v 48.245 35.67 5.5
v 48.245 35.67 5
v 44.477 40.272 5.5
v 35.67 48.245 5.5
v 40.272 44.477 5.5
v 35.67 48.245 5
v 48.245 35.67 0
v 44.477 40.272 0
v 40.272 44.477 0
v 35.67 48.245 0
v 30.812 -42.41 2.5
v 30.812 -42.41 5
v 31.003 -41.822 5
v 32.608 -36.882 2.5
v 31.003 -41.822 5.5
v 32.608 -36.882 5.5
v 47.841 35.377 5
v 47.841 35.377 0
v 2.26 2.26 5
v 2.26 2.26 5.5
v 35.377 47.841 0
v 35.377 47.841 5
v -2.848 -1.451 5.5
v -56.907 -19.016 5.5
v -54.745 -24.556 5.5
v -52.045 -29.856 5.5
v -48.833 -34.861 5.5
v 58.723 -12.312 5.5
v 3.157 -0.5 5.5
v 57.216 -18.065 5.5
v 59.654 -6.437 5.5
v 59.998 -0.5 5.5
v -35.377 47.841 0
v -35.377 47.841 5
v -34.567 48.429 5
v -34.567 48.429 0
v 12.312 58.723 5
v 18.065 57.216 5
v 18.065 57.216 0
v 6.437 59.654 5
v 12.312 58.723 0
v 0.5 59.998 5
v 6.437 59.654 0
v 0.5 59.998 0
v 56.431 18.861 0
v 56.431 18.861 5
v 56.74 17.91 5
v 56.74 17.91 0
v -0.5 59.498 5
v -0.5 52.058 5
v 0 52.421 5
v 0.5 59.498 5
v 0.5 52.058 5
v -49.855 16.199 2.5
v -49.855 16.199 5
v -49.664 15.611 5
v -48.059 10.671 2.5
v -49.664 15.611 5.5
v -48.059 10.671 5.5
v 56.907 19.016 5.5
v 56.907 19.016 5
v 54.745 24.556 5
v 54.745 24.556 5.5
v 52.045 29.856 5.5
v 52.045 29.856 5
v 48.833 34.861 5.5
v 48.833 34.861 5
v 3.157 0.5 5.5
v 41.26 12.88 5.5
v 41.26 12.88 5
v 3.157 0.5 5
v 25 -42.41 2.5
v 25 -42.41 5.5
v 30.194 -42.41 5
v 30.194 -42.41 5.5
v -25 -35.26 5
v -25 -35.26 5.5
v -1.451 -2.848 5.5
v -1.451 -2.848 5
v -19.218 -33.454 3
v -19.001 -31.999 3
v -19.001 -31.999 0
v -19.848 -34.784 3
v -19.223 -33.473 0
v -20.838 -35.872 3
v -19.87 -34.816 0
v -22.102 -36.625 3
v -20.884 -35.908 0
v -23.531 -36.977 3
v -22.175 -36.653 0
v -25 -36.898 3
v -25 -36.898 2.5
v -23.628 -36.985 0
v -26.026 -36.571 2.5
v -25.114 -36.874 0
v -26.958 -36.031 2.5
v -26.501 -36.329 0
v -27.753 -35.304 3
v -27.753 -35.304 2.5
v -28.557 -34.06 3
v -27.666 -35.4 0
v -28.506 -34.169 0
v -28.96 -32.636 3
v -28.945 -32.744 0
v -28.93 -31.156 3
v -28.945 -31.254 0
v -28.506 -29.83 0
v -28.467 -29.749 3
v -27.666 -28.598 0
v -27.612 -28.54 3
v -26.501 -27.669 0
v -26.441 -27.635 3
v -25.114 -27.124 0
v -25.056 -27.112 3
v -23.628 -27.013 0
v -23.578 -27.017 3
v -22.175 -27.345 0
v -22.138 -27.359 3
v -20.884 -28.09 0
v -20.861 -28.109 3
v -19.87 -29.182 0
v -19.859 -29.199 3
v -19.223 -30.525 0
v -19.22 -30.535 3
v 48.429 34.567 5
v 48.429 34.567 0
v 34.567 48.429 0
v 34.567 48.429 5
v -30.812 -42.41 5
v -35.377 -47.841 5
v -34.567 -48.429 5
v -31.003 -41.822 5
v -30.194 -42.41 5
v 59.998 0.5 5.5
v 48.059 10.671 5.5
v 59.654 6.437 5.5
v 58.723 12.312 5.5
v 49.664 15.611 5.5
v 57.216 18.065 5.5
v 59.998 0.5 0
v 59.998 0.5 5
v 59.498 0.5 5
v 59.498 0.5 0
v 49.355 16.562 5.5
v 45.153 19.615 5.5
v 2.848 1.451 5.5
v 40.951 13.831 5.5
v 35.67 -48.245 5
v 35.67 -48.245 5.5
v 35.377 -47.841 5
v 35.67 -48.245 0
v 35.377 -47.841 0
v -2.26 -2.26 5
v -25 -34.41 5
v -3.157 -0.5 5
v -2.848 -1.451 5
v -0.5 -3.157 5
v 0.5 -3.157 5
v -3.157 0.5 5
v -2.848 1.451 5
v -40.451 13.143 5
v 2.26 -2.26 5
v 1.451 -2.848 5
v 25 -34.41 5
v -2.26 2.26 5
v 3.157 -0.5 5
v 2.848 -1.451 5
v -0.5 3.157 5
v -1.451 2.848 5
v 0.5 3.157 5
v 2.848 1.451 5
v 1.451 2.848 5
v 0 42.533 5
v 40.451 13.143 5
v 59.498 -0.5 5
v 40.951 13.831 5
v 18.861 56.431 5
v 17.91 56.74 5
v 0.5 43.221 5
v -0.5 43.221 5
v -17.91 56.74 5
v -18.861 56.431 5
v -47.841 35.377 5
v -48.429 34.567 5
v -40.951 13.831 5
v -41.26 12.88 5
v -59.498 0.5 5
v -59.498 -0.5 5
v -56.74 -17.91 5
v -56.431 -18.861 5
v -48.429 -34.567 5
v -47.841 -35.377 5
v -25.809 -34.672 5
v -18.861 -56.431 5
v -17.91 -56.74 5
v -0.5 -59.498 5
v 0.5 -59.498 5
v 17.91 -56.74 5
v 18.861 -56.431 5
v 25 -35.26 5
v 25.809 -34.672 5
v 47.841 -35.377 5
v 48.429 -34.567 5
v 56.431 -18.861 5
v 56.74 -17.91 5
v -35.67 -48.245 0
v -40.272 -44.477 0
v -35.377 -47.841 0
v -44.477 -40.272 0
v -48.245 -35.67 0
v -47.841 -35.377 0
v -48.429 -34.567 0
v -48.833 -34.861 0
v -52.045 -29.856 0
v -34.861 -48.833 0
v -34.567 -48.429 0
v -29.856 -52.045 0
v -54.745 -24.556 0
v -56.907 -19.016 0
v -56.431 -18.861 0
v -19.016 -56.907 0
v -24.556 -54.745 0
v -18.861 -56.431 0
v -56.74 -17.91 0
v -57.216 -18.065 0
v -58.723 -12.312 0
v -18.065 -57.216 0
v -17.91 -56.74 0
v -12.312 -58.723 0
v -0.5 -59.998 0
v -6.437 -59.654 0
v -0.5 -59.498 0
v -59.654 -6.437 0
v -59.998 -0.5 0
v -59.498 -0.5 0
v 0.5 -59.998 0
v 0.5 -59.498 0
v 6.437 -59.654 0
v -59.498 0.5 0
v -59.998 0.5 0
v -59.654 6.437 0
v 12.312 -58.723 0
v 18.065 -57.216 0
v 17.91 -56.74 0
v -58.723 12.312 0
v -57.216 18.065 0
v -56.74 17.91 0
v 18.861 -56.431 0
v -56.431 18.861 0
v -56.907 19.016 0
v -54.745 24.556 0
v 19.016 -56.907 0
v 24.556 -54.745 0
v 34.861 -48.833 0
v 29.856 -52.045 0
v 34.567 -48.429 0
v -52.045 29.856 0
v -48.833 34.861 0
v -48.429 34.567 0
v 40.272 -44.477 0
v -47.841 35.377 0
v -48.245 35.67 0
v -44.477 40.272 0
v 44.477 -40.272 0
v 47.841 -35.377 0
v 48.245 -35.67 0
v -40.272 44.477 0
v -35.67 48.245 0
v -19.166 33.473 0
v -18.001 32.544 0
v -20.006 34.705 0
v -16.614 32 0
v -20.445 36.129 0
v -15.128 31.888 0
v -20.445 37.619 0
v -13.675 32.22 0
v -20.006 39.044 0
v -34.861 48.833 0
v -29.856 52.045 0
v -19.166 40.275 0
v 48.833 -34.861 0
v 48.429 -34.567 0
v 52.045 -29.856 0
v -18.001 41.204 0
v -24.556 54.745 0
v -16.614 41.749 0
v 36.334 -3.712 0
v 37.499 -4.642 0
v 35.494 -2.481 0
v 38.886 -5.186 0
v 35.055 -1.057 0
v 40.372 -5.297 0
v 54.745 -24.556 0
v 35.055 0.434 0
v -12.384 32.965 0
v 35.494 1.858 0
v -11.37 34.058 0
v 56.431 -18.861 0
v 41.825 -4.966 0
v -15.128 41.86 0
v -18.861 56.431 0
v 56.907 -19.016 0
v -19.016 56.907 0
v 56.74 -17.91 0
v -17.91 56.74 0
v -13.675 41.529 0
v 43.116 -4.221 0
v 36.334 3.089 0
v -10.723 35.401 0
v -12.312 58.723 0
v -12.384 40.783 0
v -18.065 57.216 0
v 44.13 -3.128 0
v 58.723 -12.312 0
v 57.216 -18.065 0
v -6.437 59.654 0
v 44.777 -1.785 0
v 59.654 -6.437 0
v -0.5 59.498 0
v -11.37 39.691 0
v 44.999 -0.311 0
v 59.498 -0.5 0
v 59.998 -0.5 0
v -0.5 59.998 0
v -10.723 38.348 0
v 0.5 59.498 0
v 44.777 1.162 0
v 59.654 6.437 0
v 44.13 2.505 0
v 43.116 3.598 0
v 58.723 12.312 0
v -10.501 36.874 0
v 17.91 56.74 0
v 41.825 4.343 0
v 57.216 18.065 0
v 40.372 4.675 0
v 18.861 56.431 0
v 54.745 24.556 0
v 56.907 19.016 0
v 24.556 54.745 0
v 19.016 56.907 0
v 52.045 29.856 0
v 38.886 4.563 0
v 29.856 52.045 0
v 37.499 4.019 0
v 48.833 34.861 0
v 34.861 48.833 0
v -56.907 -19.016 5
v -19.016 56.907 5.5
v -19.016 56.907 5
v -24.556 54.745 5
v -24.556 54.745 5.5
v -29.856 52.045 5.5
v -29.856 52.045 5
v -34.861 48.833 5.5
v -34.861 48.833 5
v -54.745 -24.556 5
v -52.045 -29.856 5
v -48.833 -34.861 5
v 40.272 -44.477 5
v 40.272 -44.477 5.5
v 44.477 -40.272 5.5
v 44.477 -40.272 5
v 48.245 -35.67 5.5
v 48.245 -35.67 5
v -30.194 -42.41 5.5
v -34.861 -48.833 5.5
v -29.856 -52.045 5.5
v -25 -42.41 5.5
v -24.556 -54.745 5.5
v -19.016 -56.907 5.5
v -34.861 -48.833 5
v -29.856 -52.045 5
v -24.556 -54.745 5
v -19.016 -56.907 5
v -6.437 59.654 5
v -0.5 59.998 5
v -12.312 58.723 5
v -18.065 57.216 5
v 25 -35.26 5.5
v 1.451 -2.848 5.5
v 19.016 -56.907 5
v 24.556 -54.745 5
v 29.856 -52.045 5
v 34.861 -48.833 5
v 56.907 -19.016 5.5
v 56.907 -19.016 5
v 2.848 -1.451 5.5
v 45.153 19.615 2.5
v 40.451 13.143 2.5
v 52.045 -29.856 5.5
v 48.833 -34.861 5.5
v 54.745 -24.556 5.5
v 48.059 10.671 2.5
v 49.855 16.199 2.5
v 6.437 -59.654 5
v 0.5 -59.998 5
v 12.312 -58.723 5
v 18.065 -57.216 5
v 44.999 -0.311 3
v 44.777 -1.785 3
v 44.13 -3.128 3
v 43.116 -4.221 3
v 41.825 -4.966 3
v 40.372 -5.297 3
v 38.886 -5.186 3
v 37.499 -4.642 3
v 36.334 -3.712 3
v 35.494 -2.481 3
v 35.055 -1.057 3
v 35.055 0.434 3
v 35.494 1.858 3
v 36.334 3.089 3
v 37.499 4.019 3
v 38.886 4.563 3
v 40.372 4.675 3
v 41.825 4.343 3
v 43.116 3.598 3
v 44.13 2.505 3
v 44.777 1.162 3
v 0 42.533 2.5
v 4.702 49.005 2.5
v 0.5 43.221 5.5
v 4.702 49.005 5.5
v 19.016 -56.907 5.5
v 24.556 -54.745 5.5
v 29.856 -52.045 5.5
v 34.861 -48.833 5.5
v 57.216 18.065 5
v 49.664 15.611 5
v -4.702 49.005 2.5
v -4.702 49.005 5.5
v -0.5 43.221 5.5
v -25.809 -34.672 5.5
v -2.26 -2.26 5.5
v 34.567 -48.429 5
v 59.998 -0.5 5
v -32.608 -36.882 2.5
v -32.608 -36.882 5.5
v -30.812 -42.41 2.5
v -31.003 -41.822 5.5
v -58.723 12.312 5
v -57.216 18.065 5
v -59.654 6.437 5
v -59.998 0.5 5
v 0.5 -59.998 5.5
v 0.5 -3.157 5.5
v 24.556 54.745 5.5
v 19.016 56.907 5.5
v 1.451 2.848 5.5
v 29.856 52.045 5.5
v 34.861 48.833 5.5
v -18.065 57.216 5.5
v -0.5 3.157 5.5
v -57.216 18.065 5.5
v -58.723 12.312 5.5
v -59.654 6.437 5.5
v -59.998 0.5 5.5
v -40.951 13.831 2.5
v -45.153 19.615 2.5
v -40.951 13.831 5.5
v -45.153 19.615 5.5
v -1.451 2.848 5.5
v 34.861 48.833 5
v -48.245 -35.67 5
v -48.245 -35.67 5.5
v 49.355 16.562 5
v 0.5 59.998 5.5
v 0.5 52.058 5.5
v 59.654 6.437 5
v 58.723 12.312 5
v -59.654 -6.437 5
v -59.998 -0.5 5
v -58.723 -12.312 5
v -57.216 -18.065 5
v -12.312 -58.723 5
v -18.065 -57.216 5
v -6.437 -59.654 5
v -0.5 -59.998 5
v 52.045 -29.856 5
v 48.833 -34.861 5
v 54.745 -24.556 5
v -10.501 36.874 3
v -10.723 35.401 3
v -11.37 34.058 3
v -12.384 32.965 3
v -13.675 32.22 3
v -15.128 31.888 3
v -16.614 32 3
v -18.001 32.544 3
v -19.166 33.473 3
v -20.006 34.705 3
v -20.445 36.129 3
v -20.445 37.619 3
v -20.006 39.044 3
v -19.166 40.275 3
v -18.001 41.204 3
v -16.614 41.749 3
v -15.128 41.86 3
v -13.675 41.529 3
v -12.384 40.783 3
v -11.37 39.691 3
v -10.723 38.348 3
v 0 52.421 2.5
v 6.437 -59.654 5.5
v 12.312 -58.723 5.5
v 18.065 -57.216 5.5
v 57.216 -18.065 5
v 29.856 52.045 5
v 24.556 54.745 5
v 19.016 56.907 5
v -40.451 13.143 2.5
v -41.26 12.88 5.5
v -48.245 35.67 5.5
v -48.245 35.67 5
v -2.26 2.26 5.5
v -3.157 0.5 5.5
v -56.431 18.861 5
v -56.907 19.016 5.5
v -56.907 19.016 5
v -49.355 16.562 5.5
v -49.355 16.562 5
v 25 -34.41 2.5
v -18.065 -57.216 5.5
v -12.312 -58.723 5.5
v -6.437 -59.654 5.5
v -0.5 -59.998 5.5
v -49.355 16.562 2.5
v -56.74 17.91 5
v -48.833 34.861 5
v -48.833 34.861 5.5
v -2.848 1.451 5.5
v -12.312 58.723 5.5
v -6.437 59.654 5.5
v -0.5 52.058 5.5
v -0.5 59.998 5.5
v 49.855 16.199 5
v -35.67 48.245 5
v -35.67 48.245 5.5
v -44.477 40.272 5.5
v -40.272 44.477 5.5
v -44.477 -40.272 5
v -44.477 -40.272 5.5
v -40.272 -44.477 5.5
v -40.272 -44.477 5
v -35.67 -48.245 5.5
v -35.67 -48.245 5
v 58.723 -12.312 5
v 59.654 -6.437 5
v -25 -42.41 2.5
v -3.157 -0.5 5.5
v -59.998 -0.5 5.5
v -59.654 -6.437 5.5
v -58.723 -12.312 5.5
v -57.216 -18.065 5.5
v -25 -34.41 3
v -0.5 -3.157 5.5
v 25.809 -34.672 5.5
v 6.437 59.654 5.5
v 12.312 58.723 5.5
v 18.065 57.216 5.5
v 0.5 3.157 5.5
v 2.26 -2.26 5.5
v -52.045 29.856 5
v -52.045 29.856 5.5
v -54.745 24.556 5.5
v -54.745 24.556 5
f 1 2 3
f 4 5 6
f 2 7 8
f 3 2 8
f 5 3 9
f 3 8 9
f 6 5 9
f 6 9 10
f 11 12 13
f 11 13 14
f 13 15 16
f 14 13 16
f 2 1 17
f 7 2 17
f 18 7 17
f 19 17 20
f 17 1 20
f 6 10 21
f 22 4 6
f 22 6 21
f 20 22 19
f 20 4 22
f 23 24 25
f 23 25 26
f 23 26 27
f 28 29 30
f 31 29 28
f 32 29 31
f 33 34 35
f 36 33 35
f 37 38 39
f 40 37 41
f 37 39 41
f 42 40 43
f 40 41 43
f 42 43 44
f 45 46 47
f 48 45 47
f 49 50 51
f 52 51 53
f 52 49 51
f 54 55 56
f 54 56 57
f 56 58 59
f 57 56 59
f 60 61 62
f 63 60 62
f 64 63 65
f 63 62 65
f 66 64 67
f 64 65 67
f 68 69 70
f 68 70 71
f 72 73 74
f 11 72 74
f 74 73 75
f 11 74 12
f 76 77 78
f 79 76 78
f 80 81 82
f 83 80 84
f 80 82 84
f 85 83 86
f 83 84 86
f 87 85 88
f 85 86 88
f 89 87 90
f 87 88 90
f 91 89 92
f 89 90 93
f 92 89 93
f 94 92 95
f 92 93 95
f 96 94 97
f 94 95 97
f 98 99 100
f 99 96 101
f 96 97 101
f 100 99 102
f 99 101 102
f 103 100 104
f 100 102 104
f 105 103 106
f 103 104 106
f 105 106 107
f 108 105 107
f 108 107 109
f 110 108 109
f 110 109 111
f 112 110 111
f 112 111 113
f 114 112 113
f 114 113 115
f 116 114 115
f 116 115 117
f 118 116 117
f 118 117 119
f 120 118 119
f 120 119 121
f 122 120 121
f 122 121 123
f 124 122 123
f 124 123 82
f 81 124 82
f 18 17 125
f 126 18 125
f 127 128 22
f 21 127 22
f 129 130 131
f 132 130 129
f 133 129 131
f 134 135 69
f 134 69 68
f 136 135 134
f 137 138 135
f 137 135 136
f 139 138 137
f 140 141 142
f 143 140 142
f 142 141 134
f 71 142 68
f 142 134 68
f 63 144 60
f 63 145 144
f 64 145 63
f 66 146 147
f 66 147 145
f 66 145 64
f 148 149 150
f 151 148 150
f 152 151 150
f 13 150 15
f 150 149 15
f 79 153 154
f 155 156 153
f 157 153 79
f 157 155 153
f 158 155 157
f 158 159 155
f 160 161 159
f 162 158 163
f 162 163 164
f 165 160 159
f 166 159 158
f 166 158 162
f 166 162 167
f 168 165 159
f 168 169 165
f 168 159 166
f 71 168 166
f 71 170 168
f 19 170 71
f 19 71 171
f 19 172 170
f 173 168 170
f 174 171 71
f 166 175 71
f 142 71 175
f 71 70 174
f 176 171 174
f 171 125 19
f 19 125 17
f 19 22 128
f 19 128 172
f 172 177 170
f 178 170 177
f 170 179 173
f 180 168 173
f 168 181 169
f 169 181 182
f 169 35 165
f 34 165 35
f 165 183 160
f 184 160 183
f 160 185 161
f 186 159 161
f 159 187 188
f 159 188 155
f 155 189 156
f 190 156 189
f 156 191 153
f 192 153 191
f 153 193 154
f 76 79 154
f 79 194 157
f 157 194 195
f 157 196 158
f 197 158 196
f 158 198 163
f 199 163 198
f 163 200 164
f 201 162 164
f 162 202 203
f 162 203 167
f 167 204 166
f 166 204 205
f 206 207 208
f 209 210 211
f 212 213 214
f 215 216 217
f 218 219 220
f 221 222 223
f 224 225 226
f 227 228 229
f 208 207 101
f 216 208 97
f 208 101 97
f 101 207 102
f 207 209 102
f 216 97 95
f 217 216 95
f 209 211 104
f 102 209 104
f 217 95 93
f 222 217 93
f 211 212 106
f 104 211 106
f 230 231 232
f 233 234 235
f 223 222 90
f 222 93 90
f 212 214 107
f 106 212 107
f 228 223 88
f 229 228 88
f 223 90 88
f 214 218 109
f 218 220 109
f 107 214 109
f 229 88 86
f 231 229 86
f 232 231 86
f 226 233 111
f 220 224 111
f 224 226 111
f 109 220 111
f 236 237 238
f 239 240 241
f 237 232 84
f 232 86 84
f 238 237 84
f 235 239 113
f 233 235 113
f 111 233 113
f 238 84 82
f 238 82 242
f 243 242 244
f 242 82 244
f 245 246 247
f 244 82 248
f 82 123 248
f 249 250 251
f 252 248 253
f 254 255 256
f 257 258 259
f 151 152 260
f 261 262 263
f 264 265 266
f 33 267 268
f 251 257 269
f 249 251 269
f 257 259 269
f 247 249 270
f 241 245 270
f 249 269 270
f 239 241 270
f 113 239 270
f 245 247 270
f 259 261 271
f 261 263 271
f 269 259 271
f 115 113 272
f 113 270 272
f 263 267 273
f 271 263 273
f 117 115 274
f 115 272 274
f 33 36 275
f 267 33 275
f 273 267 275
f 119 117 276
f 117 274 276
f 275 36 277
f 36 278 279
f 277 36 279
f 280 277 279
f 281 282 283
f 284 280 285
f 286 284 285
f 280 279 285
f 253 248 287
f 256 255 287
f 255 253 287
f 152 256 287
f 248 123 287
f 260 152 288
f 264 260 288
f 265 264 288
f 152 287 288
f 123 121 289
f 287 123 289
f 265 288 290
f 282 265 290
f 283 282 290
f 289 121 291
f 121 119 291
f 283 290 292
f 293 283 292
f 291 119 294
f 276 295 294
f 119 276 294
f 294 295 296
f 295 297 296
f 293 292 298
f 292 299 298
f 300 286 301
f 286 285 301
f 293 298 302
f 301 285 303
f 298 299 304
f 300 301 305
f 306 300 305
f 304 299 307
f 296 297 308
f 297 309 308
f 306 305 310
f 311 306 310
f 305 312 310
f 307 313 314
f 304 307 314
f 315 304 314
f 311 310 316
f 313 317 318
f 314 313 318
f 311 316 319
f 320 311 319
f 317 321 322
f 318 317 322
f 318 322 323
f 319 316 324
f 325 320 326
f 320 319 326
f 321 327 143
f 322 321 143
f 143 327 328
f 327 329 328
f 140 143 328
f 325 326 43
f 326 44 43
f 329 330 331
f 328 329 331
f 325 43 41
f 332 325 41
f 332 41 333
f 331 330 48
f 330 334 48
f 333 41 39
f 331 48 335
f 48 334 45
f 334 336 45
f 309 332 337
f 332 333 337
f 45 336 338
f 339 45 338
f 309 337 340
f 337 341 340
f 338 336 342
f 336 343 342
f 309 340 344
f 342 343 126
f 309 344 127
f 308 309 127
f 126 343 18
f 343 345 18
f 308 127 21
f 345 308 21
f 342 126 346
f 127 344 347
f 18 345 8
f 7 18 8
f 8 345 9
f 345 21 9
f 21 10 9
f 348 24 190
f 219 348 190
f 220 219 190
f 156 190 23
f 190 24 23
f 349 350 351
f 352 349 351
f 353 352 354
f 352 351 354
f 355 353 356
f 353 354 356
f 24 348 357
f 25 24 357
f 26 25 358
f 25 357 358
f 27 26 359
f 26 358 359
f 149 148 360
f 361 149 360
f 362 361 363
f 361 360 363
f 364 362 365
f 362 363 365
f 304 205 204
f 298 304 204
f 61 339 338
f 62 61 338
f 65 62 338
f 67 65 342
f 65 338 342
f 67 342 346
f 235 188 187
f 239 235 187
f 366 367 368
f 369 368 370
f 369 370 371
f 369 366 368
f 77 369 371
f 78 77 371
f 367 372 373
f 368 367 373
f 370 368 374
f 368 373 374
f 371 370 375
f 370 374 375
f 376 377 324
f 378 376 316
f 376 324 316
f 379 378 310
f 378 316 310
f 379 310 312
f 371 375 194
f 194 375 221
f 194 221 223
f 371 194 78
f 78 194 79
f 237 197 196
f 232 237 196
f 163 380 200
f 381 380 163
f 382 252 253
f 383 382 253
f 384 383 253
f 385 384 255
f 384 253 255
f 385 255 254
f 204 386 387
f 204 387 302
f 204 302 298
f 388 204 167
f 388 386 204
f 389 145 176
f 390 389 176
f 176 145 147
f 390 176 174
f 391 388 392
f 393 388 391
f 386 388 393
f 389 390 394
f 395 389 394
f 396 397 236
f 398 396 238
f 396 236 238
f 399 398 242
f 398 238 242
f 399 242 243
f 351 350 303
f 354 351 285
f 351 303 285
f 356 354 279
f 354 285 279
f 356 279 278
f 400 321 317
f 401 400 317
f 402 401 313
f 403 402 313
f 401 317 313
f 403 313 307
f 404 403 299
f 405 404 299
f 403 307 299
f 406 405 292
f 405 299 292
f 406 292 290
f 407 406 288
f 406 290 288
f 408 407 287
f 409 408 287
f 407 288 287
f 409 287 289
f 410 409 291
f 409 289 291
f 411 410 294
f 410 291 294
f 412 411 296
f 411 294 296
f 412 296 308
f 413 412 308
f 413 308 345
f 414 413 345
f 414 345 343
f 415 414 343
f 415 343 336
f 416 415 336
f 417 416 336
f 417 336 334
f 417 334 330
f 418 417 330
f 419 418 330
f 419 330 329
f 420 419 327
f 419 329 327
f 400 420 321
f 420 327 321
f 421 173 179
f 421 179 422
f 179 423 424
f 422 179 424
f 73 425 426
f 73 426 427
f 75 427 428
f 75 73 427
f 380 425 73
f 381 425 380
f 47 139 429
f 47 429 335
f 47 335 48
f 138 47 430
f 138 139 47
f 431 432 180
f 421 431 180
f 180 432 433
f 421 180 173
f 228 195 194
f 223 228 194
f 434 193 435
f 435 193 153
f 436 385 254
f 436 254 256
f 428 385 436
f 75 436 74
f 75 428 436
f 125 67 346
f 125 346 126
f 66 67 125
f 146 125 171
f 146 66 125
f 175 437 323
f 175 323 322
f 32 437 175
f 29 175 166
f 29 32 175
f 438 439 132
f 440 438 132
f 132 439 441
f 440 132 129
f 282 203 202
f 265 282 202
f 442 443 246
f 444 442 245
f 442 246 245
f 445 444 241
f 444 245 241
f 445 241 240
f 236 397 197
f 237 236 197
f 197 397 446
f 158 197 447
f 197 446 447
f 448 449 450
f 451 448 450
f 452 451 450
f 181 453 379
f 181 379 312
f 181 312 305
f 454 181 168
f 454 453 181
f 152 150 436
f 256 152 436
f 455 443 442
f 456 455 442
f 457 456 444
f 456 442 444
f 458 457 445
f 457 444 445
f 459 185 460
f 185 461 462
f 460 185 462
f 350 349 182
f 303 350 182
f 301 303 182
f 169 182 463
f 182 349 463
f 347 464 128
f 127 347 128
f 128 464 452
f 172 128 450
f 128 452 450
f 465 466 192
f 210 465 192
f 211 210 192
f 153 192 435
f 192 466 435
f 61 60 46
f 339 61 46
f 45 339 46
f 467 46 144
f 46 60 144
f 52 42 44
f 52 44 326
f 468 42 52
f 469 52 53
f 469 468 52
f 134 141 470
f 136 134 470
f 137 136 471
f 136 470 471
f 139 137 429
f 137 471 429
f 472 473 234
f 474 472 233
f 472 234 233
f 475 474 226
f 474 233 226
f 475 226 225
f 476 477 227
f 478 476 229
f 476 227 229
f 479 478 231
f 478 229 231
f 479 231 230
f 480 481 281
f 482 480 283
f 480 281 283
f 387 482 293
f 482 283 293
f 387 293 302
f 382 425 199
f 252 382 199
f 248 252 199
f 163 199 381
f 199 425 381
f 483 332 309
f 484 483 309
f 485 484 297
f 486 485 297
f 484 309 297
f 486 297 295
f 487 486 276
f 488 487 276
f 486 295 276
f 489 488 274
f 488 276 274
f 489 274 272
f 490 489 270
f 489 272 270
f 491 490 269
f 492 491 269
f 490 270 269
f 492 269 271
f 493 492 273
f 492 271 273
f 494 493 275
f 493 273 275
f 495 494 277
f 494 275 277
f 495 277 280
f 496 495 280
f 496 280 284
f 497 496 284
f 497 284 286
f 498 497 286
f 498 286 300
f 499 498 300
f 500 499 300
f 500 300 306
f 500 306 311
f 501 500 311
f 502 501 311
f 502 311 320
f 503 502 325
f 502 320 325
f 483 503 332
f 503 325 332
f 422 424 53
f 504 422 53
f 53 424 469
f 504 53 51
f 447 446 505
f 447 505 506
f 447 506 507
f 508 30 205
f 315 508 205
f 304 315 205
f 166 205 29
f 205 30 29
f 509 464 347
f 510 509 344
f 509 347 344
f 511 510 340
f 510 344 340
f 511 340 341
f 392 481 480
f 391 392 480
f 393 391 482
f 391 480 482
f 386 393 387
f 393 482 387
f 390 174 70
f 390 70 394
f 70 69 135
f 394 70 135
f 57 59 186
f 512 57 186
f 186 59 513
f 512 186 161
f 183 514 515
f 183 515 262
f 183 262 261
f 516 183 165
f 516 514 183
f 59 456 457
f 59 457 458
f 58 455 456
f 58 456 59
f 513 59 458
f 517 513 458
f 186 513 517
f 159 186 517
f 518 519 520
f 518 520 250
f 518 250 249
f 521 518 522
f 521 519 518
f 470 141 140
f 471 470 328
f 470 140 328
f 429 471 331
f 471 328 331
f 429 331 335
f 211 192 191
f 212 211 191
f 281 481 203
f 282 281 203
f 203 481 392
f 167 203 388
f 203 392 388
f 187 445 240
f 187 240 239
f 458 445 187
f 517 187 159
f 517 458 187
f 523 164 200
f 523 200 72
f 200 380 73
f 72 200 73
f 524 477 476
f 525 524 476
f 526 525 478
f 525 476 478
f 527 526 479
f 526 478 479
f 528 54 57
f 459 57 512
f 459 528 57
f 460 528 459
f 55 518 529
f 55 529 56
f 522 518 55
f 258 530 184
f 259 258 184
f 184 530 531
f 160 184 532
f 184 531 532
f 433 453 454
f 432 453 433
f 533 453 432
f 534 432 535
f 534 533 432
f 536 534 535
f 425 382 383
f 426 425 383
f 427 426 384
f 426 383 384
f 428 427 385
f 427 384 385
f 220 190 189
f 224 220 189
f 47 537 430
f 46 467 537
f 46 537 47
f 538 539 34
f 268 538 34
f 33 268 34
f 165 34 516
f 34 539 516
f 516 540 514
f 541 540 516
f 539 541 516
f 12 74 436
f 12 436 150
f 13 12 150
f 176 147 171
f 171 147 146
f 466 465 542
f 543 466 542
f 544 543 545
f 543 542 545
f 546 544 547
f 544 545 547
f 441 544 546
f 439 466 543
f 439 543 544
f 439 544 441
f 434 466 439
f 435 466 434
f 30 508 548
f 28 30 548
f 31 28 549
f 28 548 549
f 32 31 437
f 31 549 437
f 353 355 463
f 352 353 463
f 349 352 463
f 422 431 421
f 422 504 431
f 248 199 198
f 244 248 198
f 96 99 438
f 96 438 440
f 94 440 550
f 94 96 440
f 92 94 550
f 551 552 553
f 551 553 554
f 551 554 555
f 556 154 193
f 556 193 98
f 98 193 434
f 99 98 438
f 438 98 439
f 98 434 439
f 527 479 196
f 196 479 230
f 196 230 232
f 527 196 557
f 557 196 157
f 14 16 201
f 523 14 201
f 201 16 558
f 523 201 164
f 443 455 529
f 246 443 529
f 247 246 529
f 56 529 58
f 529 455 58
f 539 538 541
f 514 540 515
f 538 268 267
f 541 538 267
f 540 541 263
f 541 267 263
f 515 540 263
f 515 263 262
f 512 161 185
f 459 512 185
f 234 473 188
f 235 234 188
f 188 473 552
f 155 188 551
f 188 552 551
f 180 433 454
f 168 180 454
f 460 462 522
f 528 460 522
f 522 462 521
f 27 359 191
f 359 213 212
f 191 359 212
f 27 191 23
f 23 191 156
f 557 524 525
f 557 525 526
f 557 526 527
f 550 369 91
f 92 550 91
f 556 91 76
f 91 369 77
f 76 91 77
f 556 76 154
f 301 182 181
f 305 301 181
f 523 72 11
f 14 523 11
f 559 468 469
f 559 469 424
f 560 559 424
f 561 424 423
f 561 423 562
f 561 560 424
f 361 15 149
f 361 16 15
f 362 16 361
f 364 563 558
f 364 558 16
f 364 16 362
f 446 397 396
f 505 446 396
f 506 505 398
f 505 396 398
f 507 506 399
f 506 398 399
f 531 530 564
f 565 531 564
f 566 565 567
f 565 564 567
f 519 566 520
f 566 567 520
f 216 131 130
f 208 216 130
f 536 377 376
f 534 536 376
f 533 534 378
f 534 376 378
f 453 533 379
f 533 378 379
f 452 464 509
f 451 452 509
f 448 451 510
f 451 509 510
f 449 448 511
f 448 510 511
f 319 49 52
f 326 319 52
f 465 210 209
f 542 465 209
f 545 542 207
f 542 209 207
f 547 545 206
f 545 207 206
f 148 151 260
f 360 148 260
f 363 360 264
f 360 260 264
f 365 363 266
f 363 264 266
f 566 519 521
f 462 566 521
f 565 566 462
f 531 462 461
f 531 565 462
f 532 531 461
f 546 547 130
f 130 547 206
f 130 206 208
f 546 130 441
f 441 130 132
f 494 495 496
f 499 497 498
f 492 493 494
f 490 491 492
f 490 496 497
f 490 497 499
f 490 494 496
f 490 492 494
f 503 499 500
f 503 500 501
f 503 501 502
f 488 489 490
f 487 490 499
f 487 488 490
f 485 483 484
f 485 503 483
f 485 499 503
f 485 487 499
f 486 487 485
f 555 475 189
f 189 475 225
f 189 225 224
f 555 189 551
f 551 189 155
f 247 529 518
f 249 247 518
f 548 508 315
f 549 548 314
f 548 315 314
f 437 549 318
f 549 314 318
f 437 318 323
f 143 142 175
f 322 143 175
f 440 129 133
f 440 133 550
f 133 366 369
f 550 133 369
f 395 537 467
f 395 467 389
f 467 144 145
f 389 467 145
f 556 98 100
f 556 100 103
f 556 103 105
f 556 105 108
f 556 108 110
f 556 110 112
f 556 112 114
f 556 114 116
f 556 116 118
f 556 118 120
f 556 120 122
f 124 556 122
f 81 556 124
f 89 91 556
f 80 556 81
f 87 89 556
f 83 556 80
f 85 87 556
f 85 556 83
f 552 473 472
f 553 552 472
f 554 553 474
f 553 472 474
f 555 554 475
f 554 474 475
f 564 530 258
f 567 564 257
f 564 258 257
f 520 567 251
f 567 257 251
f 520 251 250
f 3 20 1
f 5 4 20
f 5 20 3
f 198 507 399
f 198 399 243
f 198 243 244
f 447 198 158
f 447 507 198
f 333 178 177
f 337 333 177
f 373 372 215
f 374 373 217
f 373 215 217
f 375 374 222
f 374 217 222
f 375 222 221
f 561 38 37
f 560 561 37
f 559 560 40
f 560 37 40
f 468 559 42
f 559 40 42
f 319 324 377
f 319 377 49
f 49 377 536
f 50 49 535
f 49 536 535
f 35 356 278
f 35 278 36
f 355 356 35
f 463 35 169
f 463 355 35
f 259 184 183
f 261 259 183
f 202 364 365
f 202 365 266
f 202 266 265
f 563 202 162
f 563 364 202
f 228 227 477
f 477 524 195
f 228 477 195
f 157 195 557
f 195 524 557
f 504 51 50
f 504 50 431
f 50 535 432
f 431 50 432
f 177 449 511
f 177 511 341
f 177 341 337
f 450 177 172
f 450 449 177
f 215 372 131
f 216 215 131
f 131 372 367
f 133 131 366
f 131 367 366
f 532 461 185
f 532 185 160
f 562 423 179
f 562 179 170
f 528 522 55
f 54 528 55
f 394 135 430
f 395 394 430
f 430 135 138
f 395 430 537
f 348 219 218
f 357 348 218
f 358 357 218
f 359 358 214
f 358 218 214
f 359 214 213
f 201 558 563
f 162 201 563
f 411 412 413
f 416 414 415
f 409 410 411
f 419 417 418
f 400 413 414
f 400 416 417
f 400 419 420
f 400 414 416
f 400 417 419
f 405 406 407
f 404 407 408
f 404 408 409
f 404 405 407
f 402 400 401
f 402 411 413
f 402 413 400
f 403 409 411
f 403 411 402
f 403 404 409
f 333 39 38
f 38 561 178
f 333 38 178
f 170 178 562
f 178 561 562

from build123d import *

# Parameters (mm, degrees)
F0_R            = 60
F1_DEPTH        = 5
F3_DEPTH        = 0.5
F4_W            = 5
F4_H            = 1
F5_DEPTH        = 5.501
F5_COPIES_COUNT = 20
F8_DEPTH        = 3
F9_R            = 5
F10_DEPTH       = 3


# Not quite as in the source:
# - a pattern or mirror of a feature is missing from the dataset's text; its kind, count and spacing are read off the source's solid


with BuildPart() as f1:
    # F0 (on Top) → F1 (new body)
    with BuildSketch(Plane.XY):
        Circle(F0_R)
    extrude(amount=F1_DEPTH)

    # F2 (on face) → F3 (join)
    with BuildSketch(Plane.XY.offset(5)):
        with BuildLine():
            ThreePointArc((59.9979166305, 0.5), (59.2613004357, 9.3860679024), (57.2159180728, 18.0648476078))
            Line((57.2159180728, 18.0648476078), (3.1568757573, 0.5))
            Line((3.1568757573, 0.5), (59.9979166305, 0.5))
        make_face()
        with BuildLine():
            ThreePointArc((56.9069010784, 19.0159041241), (53.4603914513, 27.2394299844), (48.8332268073, 34.8613820665))
            Line((48.8332268073, 34.8613820665), (2.847858763, 1.4510565163))
            Line((2.847858763, 1.4510565163), (56.9069010784, 19.0159041241))
        make_face()
        with BuildLine():
            ThreePointArc((48.245441555, 35.6703990609), (42.4264068712, 42.4264068712), (35.6703990609, 48.245441555))
            Line((35.6703990609, 48.245441555), (2.2600735107, 2.2600735107))
            Line((2.2600735107, 2.2600735107), (48.245441555, 35.6703990609))
        make_face()
        with BuildLine():
            ThreePointArc((34.8613820665, 48.8332268073), (27.2394299844, 53.4603914513), (19.0159041241, 56.9069010784))
            Line((19.0159041241, 56.9069010784), (1.4510565163, 2.847858763))
            Line((1.4510565163, 2.847858763), (34.8613820665, 48.8332268073))
        make_face()
        with BuildLine():
            ThreePointArc((18.0648476078, 57.2159180728), (9.3860679024, 59.2613004357), (0.5, 59.9979166305))
            Line((0.5, 59.9979166305), (0.5, 3.1568757573))
            Line((0.5, 3.1568757573), (18.0648476078, 57.2159180728))
        make_face()
        with BuildLine():
            ThreePointArc((-0.5, 59.9979166305), (-9.3860679024, 59.2613004357), (-18.0648476078, 57.2159180728))
            Line((-18.0648476078, 57.2159180728), (-0.5, 3.1568757573))
            Line((-0.5, 3.1568757573), (-0.5, 59.9979166305))
        make_face()
        with BuildLine():
            ThreePointArc((-19.0159041241, 56.9069010784), (-27.2394299844, 53.4603914513), (-34.8613820665, 48.8332268073))
            Line((-34.8613820665, 48.8332268073), (-1.4510565163, 2.847858763))
            Line((-1.4510565163, 2.847858763), (-19.0159041241, 56.9069010784))
        make_face()
        with BuildLine():
            ThreePointArc((-35.6703990609, 48.245441555), (-42.4264068712, 42.4264068712), (-48.245441555, 35.6703990609))
            Line((-48.245441555, 35.6703990609), (-2.2600735107, 2.2600735107))
            Line((-2.2600735107, 2.2600735107), (-35.6703990609, 48.245441555))
        make_face()
        with BuildLine():
            ThreePointArc((-48.8332268073, 34.8613820665), (-53.4603914513, 27.2394299844), (-56.9069010784, 19.0159041241))
            Line((-56.9069010784, 19.0159041241), (-2.847858763, 1.4510565163))
            Line((-2.847858763, 1.4510565163), (-48.8332268073, 34.8613820665))
        make_face()
        with BuildLine():
            ThreePointArc((-57.2159180728, 18.0648476078), (-59.2613004357, 9.3860679024), (-59.9979166305, 0.5))
            Line((-59.9979166305, 0.5), (-3.1568757573, 0.5))
            Line((-3.1568757573, 0.5), (-57.2159180728, 18.0648476078))
        make_face()
        with BuildLine():
            Line((-3.1568757573, -0.5), (-59.9979166305, -0.5))
            ThreePointArc((-59.9979166305, -0.5), (-59.2613004357, -9.3860679024), (-57.2159180728, -18.0648476078))
            Line((-57.2159180728, -18.0648476078), (-3.1568757573, -0.5))
        make_face()
        with BuildLine():
            Line((-2.847858763, -1.4510565163), (-56.9069010784, -19.0159041241))
            ThreePointArc((-56.9069010784, -19.0159041241), (-53.4603914513, -27.2394299844), (-48.8332268073, -34.8613820665))
            Line((-48.8332268073, -34.8613820665), (-2.847858763, -1.4510565163))
        make_face()
        with BuildLine():
            Line((-2.2600735107, -2.2600735107), (-48.245441555, -35.6703990609))
            ThreePointArc((-48.245441555, -35.6703990609), (-42.4264068712, -42.4264068712), (-35.6703990609, -48.245441555))
            Line((-35.6703990609, -48.245441555), (-2.2600735107, -2.2600735107))
        make_face()
        with BuildLine():
            Line((-1.4510565163, -2.847858763), (-34.8613820665, -48.8332268073))
            ThreePointArc((-34.8613820665, -48.8332268073), (-27.2394299844, -53.4603914513), (-19.0159041241, -56.9069010784))
            Line((-19.0159041241, -56.9069010784), (-1.4510565163, -2.847858763))
        make_face()
        with BuildLine():
            Line((-0.5, -3.1568757573), (-18.0648476078, -57.2159180728))
            ThreePointArc((-18.0648476078, -57.2159180728), (-9.3860679024, -59.2613004357), (-0.5, -59.9979166305))
            Line((-0.5, -59.9979166305), (-0.5, -3.1568757573))
        make_face()
        with BuildLine():
            Line((0.5, -3.1568757573), (0.5, -59.9979166305))
            ThreePointArc((0.5, -59.9979166305), (9.3860679024, -59.2613004357), (18.0648476078, -57.2159180728))
            Line((18.0648476078, -57.2159180728), (0.5, -3.1568757573))
        make_face()
        with BuildLine():
            Line((1.4510565163, -2.847858763), (19.0159041241, -56.9069010784))
            ThreePointArc((19.0159041241, -56.9069010784), (27.2394299844, -53.4603914513), (34.8613820665, -48.8332268073))
            Line((34.8613820665, -48.8332268073), (1.4510565163, -2.847858763))
        make_face()
        with BuildLine():
            Line((2.2600735107, -2.2600735107), (35.6703990609, -48.245441555))
            ThreePointArc((35.6703990609, -48.245441555), (42.4264068712, -42.4264068712), (48.245441555, -35.6703990609))
            Line((48.245441555, -35.6703990609), (2.2600735107, -2.2600735107))
        make_face()
        with BuildLine():
            Line((2.847858763, -1.4510565163), (48.8332268073, -34.8613820665))
            ThreePointArc((48.8332268073, -34.8613820665), (53.4603914513, -27.2394299844), (56.9069010784, -19.0159041241))
            Line((56.9069010784, -19.0159041241), (2.847858763, -1.4510565163))
        make_face()
        with BuildLine():
            Line((3.1568757573, -0.5), (57.2159180728, -18.0648476078))
            ThreePointArc((57.2159180728, -18.0648476078), (59.2613004357, -9.3860679024), (59.9979166305, -0.5))
            Line((59.9979166305, -0.5), (3.1568757573, -0.5))
        make_face()
    extrude(amount=F3_DEPTH)

    # F4 (on face) → F5 (cut, through all)
    with BuildSketch(Plane.XY.offset(5.5)):
        with Locations((-61.9979166305, 0)):
            Rectangle(F4_W, F4_H)
    f5 = extrude(amount=-F5_DEPTH, mode=Mode.SUBTRACT)

    # F5_copies: F5 ×20 about axis
    f5_copies_axis = Axis((0, 0, 0), (0, 0, 1))
    for i in range(1, F5_COPIES_COUNT):
        add(f5.rotate(f5_copies_axis, i * 360 / F5_COPIES_COUNT), mode=Mode.SUBTRACT)

    # F7 (on face) → F8 (cut)
    with BuildSketch(Plane.XY.offset(5.5)):
        Polygon((-4.7022820183, 49.0046763726), (0, 42.5325404176), (4.7022820183, 49.0046763726), (0, 52.4210842376), align=None)
        Polygon((-48.0593018491, 10.671141848), (-40.4508497187, 13.143277803), (-40.9508497187, 13.8314687632), (-49.3554137554, 16.562277157), (-49.8554137554, 16.199005893), align=None)
        Polygon((-49.3554137554, 16.562277157), (-40.9508497187, 13.8314687632), (-45.1531317371, 19.615413758), align=None)
        Polygon((45.1531317371, 19.615413758), (40.4508497187, 13.143277803), (48.0593018491, 10.671141848), (49.8554137554, 16.199005893), align=None)
        Polygon((-25, -42.4095480118), (-25, -34.4095480118), (-32.6084521304, -36.8816839668), (-30.812340224, -42.4095480118), align=None)
        Polygon((32.6084521304, -36.8816839668), (25, -34.4095480118), (25, -42.4095480118), (30.812340224, -42.4095480118), align=None)
    extrude(amount=-F8_DEPTH, mode=Mode.SUBTRACT)

    # F9 (on face) → F10 (cut)
    with BuildSketch(Plane(origin=(0, 0, 0), x_dir=(1, 0, 0), z_dir=(0, 0, -1))):
        with Locations((-24.0012126607, 31.9990904686)):
            Circle(F9_R)
        with Locations((-15.5012126607, -36.87427838)):
            Circle(F9_R)
        with Locations((39.9987873393, 0.3114665041)):
            Circle(F9_R)
    extrude(amount=-F10_DEPTH, mode=Mode.SUBTRACT)


solid = f1.part
